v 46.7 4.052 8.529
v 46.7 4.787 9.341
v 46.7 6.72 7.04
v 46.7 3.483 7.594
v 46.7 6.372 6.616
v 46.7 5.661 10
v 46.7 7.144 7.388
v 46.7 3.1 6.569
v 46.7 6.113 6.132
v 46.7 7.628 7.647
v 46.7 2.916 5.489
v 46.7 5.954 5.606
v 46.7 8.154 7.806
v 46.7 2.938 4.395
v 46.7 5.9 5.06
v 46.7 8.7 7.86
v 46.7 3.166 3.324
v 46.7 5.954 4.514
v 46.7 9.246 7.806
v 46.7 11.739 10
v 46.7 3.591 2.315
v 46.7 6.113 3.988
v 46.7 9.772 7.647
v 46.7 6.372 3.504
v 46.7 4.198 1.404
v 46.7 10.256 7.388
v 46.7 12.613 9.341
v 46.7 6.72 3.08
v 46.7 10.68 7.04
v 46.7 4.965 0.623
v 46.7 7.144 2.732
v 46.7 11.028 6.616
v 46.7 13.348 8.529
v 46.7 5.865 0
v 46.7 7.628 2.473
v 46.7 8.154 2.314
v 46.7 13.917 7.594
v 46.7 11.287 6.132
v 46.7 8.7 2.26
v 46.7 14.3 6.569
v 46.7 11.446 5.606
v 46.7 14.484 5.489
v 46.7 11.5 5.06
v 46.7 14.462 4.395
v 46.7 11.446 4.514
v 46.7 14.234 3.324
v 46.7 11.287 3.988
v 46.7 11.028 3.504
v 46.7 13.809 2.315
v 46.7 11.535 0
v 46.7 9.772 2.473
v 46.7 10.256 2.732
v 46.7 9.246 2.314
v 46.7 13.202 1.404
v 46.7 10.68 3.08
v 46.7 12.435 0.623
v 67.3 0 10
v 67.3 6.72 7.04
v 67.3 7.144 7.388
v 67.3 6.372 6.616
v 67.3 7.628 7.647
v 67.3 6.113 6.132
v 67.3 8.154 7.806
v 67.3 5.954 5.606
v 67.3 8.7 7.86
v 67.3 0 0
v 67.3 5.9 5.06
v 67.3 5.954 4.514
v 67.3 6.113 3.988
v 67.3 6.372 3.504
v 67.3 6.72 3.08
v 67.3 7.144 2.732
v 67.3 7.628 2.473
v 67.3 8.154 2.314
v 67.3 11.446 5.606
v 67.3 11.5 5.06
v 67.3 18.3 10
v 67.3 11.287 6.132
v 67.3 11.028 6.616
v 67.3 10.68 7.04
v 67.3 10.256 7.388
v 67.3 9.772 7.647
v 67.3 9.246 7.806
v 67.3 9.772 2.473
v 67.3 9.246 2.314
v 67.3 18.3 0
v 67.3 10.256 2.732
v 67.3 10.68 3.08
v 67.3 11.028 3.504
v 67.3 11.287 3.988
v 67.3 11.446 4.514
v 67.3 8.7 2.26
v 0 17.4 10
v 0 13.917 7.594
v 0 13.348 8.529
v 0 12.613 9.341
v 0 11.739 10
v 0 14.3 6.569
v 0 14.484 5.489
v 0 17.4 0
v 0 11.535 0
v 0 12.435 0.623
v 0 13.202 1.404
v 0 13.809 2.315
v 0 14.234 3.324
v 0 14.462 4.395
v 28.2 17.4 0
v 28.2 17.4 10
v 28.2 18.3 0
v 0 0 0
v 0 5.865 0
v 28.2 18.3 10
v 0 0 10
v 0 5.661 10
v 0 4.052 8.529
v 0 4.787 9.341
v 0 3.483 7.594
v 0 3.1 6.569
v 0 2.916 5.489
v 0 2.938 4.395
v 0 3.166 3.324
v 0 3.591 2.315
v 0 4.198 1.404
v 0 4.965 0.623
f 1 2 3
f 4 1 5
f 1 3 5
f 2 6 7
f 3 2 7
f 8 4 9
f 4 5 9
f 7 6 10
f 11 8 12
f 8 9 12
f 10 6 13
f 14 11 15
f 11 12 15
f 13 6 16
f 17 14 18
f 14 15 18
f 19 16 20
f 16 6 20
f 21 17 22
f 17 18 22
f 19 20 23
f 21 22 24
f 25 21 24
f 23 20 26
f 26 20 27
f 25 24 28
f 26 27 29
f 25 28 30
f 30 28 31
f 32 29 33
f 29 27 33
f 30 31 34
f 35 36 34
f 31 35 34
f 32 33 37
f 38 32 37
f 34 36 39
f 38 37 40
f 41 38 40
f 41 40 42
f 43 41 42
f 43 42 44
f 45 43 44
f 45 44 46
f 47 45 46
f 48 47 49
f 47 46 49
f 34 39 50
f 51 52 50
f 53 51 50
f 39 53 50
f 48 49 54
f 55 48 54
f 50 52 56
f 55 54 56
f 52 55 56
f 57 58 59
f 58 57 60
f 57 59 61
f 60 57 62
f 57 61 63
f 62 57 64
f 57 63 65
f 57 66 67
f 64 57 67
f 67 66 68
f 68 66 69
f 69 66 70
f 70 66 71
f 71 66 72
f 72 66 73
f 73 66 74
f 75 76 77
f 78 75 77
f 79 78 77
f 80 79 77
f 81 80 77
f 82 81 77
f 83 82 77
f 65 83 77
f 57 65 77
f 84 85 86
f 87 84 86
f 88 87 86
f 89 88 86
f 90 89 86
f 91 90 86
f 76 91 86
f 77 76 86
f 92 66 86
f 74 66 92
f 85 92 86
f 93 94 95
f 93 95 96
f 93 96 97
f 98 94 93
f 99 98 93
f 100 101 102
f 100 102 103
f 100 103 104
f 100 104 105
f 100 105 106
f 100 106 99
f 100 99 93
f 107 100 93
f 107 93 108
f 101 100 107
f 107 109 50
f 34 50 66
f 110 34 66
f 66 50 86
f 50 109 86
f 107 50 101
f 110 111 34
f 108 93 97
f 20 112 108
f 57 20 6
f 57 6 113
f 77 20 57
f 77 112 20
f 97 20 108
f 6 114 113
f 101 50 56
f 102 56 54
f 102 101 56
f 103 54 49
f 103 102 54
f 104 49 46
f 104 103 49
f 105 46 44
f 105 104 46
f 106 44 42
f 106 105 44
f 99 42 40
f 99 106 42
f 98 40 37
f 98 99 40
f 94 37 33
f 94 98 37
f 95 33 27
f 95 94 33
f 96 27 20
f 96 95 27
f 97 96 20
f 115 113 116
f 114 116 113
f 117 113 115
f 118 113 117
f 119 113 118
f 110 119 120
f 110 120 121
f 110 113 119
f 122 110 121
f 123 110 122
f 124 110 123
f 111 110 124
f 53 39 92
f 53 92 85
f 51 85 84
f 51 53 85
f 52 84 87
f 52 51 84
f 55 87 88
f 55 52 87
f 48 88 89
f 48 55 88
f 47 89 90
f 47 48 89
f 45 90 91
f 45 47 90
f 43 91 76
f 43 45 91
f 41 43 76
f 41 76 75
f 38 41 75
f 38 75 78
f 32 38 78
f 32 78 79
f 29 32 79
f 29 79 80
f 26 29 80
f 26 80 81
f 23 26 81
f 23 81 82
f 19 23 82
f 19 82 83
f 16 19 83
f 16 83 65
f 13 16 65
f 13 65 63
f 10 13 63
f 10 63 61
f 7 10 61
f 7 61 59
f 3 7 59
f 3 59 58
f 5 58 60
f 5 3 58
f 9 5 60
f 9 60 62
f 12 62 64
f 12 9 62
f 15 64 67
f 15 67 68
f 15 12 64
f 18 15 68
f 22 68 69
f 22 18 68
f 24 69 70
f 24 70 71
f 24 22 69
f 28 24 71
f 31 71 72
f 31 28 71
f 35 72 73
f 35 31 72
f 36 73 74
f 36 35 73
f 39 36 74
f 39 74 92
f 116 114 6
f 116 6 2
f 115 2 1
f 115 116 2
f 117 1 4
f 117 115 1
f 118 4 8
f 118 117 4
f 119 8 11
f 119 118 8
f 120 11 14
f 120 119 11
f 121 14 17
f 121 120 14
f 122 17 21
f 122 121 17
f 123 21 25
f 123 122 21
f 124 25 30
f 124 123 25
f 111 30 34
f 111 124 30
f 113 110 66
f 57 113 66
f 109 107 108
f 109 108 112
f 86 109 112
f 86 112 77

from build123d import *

# Parameters (mm, degrees)
CYLINDER001_R     = 2.8
CYLINDER001_DEPTH = 67.3
CYLINDER_R        = 5.8
CYLINDER_DEPTH    = 46.7
BOX001_W          = 28.2
BOX001_H          = 0.9
BOX001_DEPTH      = 10
BOX_W             = 67.3
BOX_H             = 18.3
BOX_DEPTH         = 10


with BuildPart() as cylinder001:
    # Cylinder001 → Cylinder001 (new body)
    with BuildSketch(Plane(origin=(0, 8.7, 5.06), x_dir=(0, 0, -1), z_dir=(1, 0, 0))):
        Circle(CYLINDER001_R)
    extrude(amount=CYLINDER001_DEPTH)


with BuildPart() as cylinder:
    # Cylinder → Cylinder (new body)
    with BuildSketch(Plane(origin=(0, 8.7, 5.06), x_dir=(0, 0, -1), z_dir=(1, 0, 0))):
        Circle(CYLINDER_R)
    extrude(amount=CYLINDER_DEPTH)


with BuildPart() as cube001:
    # Box001 → Box001 (new body)
    with BuildSketch(Plane(origin=(0, 17.4, 0), x_dir=(1, 0, 0), z_dir=(0, 0, 1))):
        with Locations((14.1, 0.45)):
            Rectangle(BOX001_W, BOX001_H)
    extrude(amount=BOX001_DEPTH)


with BuildPart() as cut002:
    # Box → Box (new body)
    with BuildSketch(Plane.XY):
        with Locations((33.65, 9.15)):
            Rectangle(BOX_W, BOX_H)
    extrude(amount=BOX_DEPTH)

    # Cut: cut Cube001
    add(cube001.part, mode=Mode.SUBTRACT)

    # Cut001: cut Cylinder
    add(cylinder.part, mode=Mode.SUBTRACT)

    # Cut002: cut Cylinder001
    add(cylinder001.part, mode=Mode.SUBTRACT)


solid = cut002.part
